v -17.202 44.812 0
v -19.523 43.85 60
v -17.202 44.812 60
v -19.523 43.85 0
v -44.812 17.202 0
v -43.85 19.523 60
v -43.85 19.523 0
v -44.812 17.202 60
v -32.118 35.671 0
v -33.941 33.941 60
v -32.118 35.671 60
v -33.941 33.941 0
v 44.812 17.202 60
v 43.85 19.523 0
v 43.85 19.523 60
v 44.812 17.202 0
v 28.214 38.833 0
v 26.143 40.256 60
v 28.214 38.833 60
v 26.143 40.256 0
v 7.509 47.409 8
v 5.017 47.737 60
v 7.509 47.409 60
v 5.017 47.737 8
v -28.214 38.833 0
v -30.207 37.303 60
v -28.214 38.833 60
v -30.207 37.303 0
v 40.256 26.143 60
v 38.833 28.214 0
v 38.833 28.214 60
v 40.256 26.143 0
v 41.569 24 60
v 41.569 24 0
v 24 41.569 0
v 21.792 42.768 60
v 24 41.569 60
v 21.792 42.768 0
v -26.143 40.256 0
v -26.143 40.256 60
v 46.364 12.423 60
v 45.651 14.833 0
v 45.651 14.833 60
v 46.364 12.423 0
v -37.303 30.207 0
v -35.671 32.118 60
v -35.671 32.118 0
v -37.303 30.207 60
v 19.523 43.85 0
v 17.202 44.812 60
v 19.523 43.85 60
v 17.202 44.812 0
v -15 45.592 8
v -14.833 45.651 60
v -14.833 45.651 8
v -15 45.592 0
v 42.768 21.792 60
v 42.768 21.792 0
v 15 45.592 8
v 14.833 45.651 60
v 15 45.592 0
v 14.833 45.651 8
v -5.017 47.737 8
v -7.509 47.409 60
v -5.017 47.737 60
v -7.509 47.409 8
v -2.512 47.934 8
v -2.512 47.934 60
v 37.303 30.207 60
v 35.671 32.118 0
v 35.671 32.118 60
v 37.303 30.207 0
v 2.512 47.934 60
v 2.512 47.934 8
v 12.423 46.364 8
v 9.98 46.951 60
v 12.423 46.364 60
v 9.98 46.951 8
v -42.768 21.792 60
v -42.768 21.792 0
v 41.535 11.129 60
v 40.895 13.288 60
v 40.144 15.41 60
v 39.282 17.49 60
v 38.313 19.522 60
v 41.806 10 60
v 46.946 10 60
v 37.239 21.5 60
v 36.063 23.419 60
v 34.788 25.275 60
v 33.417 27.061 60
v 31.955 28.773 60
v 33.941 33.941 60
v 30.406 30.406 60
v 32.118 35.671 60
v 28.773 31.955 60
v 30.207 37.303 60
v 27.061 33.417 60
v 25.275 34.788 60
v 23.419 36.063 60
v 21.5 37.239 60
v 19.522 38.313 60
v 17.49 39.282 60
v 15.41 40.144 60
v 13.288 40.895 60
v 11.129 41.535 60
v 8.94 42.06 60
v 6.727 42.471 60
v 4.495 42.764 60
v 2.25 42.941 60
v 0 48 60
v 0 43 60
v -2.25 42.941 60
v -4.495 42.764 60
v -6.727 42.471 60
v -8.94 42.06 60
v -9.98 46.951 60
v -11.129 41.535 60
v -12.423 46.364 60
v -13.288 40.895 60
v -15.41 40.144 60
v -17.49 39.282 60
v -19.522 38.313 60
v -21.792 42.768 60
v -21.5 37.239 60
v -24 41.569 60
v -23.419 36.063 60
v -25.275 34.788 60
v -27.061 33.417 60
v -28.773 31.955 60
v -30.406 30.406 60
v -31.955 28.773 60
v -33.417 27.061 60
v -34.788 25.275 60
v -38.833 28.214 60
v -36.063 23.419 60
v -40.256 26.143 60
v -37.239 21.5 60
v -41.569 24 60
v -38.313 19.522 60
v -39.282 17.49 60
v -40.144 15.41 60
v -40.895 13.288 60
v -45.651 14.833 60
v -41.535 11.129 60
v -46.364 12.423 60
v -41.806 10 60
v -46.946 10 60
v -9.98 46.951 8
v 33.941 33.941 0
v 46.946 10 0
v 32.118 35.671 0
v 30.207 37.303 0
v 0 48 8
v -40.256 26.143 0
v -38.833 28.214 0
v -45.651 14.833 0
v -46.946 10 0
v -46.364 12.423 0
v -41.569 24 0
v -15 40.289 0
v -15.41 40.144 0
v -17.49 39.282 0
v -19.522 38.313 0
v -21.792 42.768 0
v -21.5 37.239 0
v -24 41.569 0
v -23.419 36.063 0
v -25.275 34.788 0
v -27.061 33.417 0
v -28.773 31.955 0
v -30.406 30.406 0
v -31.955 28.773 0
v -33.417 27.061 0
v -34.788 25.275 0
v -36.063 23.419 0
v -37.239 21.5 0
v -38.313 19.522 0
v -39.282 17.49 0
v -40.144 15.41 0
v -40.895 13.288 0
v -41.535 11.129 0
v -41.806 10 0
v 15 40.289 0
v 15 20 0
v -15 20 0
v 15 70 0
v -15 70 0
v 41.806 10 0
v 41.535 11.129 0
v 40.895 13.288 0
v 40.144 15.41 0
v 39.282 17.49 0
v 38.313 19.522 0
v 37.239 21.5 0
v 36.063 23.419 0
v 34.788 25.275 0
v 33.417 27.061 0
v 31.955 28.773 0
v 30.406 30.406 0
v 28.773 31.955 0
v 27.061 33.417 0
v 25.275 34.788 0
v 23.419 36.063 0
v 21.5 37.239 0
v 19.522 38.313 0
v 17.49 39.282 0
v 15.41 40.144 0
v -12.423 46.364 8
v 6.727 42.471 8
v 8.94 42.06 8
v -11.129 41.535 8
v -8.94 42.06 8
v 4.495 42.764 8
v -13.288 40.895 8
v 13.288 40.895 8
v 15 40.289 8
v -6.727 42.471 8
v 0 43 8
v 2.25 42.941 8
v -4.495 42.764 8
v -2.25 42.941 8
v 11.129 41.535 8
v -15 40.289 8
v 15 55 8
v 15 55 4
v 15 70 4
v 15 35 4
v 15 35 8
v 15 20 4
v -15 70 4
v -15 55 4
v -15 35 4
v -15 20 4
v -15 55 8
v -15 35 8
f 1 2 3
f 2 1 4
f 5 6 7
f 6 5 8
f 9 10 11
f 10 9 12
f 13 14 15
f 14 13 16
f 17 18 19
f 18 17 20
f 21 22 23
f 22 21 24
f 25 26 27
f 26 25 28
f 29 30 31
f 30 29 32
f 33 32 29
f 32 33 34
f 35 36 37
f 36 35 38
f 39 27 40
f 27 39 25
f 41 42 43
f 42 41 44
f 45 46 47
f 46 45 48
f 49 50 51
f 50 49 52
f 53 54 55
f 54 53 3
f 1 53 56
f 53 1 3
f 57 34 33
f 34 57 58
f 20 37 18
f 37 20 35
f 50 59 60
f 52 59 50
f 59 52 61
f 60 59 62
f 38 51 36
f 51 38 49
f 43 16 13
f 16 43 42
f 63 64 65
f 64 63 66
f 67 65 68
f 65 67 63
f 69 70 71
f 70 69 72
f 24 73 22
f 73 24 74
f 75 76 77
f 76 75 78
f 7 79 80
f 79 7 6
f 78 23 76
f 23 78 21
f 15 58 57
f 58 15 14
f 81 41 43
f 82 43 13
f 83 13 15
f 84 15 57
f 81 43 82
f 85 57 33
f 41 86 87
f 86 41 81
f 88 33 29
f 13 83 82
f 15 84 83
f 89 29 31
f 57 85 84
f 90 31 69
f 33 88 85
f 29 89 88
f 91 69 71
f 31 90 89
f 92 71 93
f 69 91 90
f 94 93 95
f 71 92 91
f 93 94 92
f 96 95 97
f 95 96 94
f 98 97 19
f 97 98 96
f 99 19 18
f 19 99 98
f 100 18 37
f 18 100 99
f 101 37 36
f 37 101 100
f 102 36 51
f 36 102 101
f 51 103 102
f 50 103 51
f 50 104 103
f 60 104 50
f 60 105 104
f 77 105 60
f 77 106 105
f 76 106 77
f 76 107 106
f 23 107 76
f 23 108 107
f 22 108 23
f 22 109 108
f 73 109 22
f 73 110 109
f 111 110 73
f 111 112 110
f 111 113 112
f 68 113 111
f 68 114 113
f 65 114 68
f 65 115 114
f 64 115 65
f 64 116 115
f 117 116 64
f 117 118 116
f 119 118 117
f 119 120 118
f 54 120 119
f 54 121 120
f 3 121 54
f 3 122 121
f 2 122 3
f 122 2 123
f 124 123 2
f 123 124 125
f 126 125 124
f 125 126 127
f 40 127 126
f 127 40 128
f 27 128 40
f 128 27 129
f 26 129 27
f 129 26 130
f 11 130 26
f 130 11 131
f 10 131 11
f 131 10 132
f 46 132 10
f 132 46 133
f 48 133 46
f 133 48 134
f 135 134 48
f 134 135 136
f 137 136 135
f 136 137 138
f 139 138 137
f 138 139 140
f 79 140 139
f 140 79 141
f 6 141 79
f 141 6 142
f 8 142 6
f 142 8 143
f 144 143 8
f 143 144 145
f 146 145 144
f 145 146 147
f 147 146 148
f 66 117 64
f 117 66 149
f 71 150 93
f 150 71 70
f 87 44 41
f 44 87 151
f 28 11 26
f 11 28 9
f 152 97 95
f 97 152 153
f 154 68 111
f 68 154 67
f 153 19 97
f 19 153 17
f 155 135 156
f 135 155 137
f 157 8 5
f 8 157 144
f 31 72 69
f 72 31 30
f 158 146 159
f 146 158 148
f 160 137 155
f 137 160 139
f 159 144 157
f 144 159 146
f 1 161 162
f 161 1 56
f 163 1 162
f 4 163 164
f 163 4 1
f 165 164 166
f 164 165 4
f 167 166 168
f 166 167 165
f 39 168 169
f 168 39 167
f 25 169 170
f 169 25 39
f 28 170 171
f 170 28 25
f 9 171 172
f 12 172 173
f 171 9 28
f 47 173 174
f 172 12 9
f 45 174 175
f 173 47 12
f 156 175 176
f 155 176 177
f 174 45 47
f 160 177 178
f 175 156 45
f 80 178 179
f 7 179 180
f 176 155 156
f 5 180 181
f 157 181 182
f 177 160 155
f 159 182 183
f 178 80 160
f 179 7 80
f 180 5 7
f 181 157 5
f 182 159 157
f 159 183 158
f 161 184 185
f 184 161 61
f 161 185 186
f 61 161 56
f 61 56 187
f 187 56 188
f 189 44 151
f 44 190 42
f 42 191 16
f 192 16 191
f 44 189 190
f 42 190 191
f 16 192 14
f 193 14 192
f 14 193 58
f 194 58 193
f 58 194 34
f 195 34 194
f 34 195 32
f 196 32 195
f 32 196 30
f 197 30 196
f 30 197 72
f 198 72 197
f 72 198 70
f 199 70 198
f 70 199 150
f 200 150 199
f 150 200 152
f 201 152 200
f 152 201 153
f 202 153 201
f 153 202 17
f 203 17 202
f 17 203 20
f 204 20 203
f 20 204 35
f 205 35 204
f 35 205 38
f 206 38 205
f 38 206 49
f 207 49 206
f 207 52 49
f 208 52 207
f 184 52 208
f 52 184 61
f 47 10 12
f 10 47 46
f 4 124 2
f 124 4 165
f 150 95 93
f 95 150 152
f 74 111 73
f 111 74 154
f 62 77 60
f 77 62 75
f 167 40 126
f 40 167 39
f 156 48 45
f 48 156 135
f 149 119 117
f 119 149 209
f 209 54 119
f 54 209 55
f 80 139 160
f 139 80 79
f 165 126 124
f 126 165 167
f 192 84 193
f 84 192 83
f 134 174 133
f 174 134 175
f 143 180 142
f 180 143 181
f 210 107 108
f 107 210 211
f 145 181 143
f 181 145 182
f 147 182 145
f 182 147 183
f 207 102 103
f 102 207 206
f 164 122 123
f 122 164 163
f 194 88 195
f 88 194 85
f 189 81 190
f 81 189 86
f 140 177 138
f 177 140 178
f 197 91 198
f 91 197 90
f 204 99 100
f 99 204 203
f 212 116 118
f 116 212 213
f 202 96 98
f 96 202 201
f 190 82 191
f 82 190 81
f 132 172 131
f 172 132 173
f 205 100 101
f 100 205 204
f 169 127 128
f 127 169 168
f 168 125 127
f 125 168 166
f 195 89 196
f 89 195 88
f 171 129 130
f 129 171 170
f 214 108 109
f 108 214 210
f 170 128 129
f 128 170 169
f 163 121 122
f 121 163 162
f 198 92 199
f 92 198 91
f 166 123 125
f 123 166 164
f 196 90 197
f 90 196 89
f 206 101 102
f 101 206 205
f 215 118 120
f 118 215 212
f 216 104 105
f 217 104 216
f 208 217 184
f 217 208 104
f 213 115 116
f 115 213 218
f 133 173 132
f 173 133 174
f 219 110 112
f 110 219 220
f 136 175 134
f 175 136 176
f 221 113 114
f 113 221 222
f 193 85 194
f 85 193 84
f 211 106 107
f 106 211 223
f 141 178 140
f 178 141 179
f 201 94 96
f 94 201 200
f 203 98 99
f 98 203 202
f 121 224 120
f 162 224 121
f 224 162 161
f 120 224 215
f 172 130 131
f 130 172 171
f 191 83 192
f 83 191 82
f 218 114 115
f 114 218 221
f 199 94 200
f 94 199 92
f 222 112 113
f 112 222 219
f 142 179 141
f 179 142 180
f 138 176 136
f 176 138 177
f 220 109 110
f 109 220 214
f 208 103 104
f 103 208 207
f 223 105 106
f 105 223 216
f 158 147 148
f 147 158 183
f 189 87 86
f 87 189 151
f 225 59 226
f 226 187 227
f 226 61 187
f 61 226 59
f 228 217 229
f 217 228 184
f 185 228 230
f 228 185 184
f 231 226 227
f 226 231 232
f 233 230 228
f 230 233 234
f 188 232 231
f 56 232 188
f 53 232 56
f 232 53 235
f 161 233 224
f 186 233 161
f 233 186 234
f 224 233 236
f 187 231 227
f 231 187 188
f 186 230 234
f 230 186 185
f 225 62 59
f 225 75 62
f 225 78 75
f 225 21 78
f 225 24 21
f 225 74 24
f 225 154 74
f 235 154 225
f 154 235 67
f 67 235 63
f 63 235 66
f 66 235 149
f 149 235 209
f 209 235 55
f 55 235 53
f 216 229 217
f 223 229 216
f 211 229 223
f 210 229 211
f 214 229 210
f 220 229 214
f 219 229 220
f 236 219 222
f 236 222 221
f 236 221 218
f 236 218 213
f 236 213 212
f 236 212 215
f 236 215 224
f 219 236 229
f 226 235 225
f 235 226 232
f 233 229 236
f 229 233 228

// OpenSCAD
$fn=120;
translate([-15,20,0])cube([30,50,4]);
translate([-15,35,0])cube([30,20,8]);
difference(){
cylinder(r=48, h=60);
cylinder(r=43, h=60);
translate([-50,-50,0]) cube([100,60,60]);
}
